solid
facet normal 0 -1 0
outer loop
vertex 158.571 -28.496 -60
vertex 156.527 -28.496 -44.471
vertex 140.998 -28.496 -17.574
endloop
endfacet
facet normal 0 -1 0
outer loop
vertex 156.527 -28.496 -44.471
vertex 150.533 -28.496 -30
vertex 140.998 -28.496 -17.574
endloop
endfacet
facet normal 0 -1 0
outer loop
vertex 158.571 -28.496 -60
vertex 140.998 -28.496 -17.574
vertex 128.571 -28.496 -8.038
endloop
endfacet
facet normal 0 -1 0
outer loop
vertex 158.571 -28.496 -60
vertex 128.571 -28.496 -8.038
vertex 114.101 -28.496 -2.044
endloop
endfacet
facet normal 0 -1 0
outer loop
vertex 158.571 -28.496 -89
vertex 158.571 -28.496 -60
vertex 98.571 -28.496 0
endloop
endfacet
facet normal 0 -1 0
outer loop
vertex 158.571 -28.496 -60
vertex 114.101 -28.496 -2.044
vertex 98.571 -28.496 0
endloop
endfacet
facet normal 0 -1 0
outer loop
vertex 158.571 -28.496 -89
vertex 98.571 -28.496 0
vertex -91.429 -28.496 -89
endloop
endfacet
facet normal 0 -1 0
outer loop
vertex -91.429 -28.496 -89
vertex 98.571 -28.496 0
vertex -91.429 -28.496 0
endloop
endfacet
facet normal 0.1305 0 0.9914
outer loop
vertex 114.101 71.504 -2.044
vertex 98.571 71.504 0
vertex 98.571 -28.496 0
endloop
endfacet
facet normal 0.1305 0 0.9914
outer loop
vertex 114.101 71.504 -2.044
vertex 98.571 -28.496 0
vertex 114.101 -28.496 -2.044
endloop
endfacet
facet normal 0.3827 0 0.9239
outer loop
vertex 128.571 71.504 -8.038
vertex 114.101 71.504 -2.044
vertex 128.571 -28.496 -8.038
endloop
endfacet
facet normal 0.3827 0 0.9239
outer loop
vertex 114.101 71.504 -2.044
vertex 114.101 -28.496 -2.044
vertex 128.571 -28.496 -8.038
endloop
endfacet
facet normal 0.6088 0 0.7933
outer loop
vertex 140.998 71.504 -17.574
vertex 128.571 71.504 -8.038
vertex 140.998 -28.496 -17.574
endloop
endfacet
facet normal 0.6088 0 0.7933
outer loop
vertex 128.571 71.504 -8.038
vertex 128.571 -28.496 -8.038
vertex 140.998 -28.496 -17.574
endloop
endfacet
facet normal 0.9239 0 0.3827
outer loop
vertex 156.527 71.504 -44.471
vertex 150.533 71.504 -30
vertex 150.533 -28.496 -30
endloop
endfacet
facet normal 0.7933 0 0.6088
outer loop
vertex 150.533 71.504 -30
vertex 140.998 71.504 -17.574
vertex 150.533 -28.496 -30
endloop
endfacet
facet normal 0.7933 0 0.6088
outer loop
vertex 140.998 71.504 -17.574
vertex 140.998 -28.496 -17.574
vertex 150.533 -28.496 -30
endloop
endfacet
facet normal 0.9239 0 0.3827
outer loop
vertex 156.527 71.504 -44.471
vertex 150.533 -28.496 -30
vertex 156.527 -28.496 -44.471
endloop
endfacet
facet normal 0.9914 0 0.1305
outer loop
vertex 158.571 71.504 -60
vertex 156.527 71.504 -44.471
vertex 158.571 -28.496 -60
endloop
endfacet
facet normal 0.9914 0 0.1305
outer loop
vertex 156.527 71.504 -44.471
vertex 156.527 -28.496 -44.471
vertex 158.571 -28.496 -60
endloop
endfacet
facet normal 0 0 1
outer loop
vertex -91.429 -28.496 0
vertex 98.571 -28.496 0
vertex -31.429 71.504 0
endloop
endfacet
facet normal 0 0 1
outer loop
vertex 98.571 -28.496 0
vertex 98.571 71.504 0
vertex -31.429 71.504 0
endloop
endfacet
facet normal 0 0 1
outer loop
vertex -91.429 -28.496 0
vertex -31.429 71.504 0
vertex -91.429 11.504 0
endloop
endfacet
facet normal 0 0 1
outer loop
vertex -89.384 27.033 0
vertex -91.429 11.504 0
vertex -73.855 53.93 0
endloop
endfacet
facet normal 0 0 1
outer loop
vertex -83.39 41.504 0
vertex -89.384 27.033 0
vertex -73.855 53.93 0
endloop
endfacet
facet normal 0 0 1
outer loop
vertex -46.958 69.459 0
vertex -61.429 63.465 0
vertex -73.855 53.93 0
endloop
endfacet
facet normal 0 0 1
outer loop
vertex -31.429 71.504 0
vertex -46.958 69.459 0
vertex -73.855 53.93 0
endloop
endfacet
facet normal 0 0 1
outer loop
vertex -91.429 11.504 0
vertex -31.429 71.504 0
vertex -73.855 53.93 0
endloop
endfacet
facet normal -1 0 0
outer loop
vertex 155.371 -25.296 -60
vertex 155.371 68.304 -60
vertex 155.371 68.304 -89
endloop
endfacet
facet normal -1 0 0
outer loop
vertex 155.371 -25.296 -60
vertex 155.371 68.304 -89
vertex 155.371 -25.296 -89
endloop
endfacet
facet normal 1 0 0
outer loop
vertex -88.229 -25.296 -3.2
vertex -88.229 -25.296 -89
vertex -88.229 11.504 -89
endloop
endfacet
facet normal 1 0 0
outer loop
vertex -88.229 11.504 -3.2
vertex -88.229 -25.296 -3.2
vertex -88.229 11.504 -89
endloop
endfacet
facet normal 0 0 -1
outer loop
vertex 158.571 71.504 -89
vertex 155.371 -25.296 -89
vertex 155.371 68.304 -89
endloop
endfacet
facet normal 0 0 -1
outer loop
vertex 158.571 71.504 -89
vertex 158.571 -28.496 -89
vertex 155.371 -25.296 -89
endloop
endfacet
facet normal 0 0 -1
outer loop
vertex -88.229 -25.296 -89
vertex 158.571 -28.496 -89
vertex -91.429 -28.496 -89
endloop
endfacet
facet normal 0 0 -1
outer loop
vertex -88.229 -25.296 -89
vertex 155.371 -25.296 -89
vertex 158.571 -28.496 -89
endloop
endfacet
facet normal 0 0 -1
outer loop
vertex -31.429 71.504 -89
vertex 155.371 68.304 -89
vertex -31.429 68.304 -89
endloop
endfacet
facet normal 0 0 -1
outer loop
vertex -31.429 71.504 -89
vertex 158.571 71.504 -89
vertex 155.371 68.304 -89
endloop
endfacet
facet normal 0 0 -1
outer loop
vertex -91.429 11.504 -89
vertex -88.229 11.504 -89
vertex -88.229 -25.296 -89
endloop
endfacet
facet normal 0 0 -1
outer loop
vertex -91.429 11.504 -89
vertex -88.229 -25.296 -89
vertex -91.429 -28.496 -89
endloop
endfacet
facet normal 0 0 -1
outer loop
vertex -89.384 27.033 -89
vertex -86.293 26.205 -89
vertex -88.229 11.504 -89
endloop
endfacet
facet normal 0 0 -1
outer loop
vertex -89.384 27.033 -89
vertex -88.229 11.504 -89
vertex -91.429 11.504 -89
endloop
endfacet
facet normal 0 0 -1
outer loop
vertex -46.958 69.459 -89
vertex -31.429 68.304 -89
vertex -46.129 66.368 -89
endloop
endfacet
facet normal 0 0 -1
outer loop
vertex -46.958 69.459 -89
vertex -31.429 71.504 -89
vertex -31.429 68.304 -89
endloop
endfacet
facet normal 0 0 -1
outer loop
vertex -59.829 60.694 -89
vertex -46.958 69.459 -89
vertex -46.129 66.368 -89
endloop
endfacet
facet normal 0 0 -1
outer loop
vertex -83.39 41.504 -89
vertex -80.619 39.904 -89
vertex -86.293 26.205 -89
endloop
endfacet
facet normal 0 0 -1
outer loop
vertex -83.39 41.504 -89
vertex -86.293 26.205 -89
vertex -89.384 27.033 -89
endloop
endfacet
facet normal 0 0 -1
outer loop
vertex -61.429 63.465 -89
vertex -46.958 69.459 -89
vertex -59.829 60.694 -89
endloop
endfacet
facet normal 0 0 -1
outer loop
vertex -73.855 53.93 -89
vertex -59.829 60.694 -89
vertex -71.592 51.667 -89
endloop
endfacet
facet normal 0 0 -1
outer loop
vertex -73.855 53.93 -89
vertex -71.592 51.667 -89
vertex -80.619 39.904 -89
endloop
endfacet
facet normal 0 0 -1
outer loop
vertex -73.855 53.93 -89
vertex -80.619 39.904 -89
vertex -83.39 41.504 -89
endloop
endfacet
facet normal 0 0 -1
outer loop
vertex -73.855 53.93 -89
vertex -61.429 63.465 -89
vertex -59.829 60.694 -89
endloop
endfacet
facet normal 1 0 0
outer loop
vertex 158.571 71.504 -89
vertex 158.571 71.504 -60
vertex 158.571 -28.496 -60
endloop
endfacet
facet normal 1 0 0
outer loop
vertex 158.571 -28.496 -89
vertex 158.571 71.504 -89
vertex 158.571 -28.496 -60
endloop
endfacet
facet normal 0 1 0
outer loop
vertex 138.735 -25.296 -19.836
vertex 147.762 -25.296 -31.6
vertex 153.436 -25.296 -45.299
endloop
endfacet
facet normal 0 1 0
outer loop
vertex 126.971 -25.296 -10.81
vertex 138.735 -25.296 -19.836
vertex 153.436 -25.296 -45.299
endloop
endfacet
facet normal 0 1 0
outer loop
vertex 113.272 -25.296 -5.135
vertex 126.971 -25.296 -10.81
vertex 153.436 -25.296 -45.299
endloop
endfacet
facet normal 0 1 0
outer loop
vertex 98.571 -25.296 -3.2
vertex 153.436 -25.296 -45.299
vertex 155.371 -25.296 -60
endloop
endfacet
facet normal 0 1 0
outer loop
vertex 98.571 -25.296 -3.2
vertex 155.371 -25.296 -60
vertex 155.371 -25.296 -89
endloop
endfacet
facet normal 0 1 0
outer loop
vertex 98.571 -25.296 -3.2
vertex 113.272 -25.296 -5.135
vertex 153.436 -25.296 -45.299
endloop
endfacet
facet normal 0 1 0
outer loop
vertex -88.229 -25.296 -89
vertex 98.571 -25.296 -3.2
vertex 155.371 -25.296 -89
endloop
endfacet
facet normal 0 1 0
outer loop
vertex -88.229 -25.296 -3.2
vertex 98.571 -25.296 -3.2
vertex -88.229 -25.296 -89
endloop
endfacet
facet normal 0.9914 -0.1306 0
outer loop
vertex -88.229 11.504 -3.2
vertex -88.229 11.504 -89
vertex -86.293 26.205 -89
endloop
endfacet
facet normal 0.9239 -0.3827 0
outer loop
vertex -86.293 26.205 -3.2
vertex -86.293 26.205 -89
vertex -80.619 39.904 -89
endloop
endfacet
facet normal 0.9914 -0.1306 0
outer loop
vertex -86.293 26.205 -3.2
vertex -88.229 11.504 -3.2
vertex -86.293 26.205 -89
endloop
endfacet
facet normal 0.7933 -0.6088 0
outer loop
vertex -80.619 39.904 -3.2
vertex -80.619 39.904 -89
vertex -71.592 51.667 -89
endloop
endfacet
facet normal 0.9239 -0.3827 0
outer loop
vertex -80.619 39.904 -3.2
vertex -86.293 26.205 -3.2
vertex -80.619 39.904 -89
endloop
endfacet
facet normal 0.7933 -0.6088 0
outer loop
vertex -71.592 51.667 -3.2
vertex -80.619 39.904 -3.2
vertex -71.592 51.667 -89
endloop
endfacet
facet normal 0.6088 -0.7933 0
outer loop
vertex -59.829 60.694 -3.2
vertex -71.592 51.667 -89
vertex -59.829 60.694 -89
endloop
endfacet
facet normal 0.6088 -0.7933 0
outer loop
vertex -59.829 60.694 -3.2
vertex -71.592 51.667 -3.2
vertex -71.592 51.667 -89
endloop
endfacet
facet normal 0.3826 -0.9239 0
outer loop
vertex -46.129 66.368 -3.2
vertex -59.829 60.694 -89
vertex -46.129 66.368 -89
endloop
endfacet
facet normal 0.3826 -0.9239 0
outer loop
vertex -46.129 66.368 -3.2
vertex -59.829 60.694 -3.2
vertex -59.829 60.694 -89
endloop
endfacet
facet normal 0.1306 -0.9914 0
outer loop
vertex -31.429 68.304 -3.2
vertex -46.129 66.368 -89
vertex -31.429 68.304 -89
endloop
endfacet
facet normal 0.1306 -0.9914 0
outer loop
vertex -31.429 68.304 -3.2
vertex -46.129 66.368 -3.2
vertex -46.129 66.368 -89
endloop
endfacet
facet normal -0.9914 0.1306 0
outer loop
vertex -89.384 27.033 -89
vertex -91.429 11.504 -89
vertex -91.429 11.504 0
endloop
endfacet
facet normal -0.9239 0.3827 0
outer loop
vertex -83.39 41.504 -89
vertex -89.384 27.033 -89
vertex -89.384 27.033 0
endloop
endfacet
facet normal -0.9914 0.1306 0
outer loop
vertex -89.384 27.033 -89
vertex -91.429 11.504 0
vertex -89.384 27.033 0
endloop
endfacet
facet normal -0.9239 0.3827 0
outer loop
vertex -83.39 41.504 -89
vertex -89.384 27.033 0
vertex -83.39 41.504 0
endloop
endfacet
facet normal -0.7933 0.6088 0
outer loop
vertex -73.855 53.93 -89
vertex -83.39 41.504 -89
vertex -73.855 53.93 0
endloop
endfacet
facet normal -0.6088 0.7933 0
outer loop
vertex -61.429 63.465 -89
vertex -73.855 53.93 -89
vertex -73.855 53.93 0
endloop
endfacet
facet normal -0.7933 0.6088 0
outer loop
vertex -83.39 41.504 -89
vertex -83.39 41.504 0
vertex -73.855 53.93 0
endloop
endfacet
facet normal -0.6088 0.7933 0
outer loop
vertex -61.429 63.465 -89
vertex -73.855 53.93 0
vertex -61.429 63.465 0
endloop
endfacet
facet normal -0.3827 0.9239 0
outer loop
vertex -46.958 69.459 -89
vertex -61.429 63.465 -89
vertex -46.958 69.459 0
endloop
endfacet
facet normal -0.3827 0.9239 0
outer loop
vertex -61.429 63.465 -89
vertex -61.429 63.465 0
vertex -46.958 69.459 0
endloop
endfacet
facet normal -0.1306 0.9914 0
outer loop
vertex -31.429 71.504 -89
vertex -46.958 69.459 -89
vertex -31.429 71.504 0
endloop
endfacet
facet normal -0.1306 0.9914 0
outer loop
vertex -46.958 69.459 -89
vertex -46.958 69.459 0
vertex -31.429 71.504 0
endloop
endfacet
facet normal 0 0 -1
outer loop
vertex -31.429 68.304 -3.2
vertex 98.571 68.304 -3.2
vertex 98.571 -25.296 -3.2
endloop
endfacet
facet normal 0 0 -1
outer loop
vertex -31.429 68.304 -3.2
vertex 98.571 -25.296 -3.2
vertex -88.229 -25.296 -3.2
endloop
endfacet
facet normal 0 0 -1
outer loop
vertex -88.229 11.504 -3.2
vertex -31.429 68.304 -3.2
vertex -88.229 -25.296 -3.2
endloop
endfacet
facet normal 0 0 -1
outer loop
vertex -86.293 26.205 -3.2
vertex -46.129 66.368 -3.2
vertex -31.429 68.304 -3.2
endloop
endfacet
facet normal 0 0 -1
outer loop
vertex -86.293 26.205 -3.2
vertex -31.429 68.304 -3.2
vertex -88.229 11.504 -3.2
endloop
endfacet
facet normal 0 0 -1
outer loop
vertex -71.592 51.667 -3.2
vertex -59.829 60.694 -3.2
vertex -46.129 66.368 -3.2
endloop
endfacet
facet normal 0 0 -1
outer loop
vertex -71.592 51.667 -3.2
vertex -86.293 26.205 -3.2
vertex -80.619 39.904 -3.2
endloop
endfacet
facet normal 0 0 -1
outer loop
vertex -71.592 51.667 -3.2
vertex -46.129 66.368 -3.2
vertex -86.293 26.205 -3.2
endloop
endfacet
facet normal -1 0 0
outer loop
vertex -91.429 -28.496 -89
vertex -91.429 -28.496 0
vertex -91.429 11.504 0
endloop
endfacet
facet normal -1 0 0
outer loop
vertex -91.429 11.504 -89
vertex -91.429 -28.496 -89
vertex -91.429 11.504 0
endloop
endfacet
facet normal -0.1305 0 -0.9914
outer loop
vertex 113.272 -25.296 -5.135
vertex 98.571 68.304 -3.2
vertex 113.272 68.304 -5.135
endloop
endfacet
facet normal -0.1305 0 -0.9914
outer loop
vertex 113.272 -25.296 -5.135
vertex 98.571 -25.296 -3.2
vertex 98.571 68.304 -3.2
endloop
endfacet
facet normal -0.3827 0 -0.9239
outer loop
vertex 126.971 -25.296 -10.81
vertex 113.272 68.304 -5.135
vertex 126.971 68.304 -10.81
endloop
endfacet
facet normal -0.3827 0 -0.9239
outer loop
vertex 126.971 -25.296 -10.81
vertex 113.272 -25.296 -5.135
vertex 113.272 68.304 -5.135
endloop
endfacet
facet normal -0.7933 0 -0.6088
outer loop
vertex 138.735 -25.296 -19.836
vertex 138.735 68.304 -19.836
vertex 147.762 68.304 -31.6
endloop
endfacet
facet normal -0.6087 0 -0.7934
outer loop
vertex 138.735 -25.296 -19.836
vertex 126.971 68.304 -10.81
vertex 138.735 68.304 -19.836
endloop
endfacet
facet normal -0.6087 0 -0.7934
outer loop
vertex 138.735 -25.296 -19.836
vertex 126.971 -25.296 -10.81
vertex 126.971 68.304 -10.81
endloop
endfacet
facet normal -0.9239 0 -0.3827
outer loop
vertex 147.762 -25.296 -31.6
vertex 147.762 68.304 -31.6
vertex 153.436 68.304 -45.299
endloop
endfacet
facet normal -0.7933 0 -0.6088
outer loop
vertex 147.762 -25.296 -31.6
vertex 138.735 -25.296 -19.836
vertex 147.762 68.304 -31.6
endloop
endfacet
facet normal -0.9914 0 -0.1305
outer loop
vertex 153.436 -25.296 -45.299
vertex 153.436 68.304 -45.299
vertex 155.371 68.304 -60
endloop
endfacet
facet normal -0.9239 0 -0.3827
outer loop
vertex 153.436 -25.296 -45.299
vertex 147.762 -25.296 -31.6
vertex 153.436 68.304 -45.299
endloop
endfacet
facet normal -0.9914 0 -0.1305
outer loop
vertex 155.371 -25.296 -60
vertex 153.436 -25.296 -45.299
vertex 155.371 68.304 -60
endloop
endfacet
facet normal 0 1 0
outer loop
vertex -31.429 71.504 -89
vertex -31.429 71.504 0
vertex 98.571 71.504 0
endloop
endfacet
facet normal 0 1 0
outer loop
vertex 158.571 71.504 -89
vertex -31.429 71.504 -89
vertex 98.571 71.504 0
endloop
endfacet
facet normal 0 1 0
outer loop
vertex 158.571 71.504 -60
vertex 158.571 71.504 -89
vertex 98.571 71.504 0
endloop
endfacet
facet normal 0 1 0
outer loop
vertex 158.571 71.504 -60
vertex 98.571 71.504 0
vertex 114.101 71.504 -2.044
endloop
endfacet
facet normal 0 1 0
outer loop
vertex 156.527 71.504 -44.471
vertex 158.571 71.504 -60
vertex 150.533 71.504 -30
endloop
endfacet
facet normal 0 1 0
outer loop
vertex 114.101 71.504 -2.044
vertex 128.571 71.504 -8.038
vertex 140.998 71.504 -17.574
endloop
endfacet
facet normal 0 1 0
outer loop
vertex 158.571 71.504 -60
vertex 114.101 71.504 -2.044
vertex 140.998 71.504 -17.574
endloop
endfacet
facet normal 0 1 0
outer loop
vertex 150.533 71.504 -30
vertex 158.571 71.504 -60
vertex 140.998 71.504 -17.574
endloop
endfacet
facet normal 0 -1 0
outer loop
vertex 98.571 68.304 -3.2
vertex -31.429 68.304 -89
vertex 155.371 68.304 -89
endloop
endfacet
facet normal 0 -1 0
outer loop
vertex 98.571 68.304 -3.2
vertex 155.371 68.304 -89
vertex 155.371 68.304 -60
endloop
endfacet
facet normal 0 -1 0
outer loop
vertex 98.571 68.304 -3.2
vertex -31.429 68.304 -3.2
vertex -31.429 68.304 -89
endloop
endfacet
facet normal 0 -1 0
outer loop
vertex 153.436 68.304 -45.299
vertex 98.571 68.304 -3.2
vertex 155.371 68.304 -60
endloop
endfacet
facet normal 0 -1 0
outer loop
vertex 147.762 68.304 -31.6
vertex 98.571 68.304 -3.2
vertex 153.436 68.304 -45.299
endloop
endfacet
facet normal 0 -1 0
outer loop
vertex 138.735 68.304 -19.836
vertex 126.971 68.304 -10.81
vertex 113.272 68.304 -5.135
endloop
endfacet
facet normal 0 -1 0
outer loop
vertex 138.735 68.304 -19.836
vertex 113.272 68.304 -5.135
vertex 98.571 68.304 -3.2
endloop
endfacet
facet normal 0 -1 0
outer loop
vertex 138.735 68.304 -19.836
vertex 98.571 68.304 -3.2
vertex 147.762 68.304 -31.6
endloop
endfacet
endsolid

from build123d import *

# Parameters (mm, degrees)
BOSS_EXTRUDE1_DEPTH     = 89
CUT_EXTRUDE1_DEPTH      = 208.523246792
CUT_EXTRUDE1_DEPTH_BACK = 208.523246792
SKETCH3_OUTSIDE_W       = 308.718
SKETCH3_OUTSIDE_H       = 147.718
SHELL1_T                = -3.2


with BuildPart() as part:
    # Sketch2 → Boss-Extrude1 (new body)
    with BuildSketch(Plane.XY):
        with BuildLine():
            Line((-91.428571429, -28.496240602), (-91.428571429, 11.503759398))
            ThreePointArc((-91.428571429, 11.503759398), (-73.8549783, 53.93016627), (-31.428571429, 71.503759398))
            Line((-31.428571429, 71.503759398), (158.571428571, 71.503759398))
            Line((158.571428571, 71.503759398), (158.571428571, -28.496240602))
            Line((158.571428571, -28.496240602), (-91.428571429, -28.496240602))
        make_face()
    extrude(amount=-BOSS_EXTRUDE1_DEPTH)

    # Sketch3 outside → Cut-Extrude1 (cut, two sides: drawn at the far end of the back side and taken through both)
    with BuildSketch(Plane(origin=(0, 71.503759398, 0), x_dir=(1, 0, 0), z_dir=(0, 1, 0)).offset(-CUT_EXTRUDE1_DEPTH_BACK)):
        with Locations((33.571, 44.5)):
            Rectangle(SKETCH3_OUTSIDE_W, SKETCH3_OUTSIDE_H)
        with BuildLine():
            Line((-91.428571429, 0), (98.571428571, 0))
            ThreePointArc((98.571428571, 0), (140.997835443, 17.573593129), (158.571428571, 60))
            Line((158.571428571, 60), (158.571428571, 89))
            Line((158.571428571, 89), (-91.428571429, 89))
            Line((-91.428571429, 89), (-91.428571429, 0))
        make_face(mode=Mode.SUBTRACT)
    extrude(amount=CUT_EXTRUDE1_DEPTH + CUT_EXTRUDE1_DEPTH_BACK, mode=Mode.SUBTRACT)

    # Shell1
    shell1_openings = [part.faces().sort_by_distance(p)[0] for p in [
        (37.130073368, 20.336721461, -89),
    ]]
    offset(amount=SHELL1_T, openings=shell1_openings, kind=Kind.INTERSECTION)


solid = part.part
